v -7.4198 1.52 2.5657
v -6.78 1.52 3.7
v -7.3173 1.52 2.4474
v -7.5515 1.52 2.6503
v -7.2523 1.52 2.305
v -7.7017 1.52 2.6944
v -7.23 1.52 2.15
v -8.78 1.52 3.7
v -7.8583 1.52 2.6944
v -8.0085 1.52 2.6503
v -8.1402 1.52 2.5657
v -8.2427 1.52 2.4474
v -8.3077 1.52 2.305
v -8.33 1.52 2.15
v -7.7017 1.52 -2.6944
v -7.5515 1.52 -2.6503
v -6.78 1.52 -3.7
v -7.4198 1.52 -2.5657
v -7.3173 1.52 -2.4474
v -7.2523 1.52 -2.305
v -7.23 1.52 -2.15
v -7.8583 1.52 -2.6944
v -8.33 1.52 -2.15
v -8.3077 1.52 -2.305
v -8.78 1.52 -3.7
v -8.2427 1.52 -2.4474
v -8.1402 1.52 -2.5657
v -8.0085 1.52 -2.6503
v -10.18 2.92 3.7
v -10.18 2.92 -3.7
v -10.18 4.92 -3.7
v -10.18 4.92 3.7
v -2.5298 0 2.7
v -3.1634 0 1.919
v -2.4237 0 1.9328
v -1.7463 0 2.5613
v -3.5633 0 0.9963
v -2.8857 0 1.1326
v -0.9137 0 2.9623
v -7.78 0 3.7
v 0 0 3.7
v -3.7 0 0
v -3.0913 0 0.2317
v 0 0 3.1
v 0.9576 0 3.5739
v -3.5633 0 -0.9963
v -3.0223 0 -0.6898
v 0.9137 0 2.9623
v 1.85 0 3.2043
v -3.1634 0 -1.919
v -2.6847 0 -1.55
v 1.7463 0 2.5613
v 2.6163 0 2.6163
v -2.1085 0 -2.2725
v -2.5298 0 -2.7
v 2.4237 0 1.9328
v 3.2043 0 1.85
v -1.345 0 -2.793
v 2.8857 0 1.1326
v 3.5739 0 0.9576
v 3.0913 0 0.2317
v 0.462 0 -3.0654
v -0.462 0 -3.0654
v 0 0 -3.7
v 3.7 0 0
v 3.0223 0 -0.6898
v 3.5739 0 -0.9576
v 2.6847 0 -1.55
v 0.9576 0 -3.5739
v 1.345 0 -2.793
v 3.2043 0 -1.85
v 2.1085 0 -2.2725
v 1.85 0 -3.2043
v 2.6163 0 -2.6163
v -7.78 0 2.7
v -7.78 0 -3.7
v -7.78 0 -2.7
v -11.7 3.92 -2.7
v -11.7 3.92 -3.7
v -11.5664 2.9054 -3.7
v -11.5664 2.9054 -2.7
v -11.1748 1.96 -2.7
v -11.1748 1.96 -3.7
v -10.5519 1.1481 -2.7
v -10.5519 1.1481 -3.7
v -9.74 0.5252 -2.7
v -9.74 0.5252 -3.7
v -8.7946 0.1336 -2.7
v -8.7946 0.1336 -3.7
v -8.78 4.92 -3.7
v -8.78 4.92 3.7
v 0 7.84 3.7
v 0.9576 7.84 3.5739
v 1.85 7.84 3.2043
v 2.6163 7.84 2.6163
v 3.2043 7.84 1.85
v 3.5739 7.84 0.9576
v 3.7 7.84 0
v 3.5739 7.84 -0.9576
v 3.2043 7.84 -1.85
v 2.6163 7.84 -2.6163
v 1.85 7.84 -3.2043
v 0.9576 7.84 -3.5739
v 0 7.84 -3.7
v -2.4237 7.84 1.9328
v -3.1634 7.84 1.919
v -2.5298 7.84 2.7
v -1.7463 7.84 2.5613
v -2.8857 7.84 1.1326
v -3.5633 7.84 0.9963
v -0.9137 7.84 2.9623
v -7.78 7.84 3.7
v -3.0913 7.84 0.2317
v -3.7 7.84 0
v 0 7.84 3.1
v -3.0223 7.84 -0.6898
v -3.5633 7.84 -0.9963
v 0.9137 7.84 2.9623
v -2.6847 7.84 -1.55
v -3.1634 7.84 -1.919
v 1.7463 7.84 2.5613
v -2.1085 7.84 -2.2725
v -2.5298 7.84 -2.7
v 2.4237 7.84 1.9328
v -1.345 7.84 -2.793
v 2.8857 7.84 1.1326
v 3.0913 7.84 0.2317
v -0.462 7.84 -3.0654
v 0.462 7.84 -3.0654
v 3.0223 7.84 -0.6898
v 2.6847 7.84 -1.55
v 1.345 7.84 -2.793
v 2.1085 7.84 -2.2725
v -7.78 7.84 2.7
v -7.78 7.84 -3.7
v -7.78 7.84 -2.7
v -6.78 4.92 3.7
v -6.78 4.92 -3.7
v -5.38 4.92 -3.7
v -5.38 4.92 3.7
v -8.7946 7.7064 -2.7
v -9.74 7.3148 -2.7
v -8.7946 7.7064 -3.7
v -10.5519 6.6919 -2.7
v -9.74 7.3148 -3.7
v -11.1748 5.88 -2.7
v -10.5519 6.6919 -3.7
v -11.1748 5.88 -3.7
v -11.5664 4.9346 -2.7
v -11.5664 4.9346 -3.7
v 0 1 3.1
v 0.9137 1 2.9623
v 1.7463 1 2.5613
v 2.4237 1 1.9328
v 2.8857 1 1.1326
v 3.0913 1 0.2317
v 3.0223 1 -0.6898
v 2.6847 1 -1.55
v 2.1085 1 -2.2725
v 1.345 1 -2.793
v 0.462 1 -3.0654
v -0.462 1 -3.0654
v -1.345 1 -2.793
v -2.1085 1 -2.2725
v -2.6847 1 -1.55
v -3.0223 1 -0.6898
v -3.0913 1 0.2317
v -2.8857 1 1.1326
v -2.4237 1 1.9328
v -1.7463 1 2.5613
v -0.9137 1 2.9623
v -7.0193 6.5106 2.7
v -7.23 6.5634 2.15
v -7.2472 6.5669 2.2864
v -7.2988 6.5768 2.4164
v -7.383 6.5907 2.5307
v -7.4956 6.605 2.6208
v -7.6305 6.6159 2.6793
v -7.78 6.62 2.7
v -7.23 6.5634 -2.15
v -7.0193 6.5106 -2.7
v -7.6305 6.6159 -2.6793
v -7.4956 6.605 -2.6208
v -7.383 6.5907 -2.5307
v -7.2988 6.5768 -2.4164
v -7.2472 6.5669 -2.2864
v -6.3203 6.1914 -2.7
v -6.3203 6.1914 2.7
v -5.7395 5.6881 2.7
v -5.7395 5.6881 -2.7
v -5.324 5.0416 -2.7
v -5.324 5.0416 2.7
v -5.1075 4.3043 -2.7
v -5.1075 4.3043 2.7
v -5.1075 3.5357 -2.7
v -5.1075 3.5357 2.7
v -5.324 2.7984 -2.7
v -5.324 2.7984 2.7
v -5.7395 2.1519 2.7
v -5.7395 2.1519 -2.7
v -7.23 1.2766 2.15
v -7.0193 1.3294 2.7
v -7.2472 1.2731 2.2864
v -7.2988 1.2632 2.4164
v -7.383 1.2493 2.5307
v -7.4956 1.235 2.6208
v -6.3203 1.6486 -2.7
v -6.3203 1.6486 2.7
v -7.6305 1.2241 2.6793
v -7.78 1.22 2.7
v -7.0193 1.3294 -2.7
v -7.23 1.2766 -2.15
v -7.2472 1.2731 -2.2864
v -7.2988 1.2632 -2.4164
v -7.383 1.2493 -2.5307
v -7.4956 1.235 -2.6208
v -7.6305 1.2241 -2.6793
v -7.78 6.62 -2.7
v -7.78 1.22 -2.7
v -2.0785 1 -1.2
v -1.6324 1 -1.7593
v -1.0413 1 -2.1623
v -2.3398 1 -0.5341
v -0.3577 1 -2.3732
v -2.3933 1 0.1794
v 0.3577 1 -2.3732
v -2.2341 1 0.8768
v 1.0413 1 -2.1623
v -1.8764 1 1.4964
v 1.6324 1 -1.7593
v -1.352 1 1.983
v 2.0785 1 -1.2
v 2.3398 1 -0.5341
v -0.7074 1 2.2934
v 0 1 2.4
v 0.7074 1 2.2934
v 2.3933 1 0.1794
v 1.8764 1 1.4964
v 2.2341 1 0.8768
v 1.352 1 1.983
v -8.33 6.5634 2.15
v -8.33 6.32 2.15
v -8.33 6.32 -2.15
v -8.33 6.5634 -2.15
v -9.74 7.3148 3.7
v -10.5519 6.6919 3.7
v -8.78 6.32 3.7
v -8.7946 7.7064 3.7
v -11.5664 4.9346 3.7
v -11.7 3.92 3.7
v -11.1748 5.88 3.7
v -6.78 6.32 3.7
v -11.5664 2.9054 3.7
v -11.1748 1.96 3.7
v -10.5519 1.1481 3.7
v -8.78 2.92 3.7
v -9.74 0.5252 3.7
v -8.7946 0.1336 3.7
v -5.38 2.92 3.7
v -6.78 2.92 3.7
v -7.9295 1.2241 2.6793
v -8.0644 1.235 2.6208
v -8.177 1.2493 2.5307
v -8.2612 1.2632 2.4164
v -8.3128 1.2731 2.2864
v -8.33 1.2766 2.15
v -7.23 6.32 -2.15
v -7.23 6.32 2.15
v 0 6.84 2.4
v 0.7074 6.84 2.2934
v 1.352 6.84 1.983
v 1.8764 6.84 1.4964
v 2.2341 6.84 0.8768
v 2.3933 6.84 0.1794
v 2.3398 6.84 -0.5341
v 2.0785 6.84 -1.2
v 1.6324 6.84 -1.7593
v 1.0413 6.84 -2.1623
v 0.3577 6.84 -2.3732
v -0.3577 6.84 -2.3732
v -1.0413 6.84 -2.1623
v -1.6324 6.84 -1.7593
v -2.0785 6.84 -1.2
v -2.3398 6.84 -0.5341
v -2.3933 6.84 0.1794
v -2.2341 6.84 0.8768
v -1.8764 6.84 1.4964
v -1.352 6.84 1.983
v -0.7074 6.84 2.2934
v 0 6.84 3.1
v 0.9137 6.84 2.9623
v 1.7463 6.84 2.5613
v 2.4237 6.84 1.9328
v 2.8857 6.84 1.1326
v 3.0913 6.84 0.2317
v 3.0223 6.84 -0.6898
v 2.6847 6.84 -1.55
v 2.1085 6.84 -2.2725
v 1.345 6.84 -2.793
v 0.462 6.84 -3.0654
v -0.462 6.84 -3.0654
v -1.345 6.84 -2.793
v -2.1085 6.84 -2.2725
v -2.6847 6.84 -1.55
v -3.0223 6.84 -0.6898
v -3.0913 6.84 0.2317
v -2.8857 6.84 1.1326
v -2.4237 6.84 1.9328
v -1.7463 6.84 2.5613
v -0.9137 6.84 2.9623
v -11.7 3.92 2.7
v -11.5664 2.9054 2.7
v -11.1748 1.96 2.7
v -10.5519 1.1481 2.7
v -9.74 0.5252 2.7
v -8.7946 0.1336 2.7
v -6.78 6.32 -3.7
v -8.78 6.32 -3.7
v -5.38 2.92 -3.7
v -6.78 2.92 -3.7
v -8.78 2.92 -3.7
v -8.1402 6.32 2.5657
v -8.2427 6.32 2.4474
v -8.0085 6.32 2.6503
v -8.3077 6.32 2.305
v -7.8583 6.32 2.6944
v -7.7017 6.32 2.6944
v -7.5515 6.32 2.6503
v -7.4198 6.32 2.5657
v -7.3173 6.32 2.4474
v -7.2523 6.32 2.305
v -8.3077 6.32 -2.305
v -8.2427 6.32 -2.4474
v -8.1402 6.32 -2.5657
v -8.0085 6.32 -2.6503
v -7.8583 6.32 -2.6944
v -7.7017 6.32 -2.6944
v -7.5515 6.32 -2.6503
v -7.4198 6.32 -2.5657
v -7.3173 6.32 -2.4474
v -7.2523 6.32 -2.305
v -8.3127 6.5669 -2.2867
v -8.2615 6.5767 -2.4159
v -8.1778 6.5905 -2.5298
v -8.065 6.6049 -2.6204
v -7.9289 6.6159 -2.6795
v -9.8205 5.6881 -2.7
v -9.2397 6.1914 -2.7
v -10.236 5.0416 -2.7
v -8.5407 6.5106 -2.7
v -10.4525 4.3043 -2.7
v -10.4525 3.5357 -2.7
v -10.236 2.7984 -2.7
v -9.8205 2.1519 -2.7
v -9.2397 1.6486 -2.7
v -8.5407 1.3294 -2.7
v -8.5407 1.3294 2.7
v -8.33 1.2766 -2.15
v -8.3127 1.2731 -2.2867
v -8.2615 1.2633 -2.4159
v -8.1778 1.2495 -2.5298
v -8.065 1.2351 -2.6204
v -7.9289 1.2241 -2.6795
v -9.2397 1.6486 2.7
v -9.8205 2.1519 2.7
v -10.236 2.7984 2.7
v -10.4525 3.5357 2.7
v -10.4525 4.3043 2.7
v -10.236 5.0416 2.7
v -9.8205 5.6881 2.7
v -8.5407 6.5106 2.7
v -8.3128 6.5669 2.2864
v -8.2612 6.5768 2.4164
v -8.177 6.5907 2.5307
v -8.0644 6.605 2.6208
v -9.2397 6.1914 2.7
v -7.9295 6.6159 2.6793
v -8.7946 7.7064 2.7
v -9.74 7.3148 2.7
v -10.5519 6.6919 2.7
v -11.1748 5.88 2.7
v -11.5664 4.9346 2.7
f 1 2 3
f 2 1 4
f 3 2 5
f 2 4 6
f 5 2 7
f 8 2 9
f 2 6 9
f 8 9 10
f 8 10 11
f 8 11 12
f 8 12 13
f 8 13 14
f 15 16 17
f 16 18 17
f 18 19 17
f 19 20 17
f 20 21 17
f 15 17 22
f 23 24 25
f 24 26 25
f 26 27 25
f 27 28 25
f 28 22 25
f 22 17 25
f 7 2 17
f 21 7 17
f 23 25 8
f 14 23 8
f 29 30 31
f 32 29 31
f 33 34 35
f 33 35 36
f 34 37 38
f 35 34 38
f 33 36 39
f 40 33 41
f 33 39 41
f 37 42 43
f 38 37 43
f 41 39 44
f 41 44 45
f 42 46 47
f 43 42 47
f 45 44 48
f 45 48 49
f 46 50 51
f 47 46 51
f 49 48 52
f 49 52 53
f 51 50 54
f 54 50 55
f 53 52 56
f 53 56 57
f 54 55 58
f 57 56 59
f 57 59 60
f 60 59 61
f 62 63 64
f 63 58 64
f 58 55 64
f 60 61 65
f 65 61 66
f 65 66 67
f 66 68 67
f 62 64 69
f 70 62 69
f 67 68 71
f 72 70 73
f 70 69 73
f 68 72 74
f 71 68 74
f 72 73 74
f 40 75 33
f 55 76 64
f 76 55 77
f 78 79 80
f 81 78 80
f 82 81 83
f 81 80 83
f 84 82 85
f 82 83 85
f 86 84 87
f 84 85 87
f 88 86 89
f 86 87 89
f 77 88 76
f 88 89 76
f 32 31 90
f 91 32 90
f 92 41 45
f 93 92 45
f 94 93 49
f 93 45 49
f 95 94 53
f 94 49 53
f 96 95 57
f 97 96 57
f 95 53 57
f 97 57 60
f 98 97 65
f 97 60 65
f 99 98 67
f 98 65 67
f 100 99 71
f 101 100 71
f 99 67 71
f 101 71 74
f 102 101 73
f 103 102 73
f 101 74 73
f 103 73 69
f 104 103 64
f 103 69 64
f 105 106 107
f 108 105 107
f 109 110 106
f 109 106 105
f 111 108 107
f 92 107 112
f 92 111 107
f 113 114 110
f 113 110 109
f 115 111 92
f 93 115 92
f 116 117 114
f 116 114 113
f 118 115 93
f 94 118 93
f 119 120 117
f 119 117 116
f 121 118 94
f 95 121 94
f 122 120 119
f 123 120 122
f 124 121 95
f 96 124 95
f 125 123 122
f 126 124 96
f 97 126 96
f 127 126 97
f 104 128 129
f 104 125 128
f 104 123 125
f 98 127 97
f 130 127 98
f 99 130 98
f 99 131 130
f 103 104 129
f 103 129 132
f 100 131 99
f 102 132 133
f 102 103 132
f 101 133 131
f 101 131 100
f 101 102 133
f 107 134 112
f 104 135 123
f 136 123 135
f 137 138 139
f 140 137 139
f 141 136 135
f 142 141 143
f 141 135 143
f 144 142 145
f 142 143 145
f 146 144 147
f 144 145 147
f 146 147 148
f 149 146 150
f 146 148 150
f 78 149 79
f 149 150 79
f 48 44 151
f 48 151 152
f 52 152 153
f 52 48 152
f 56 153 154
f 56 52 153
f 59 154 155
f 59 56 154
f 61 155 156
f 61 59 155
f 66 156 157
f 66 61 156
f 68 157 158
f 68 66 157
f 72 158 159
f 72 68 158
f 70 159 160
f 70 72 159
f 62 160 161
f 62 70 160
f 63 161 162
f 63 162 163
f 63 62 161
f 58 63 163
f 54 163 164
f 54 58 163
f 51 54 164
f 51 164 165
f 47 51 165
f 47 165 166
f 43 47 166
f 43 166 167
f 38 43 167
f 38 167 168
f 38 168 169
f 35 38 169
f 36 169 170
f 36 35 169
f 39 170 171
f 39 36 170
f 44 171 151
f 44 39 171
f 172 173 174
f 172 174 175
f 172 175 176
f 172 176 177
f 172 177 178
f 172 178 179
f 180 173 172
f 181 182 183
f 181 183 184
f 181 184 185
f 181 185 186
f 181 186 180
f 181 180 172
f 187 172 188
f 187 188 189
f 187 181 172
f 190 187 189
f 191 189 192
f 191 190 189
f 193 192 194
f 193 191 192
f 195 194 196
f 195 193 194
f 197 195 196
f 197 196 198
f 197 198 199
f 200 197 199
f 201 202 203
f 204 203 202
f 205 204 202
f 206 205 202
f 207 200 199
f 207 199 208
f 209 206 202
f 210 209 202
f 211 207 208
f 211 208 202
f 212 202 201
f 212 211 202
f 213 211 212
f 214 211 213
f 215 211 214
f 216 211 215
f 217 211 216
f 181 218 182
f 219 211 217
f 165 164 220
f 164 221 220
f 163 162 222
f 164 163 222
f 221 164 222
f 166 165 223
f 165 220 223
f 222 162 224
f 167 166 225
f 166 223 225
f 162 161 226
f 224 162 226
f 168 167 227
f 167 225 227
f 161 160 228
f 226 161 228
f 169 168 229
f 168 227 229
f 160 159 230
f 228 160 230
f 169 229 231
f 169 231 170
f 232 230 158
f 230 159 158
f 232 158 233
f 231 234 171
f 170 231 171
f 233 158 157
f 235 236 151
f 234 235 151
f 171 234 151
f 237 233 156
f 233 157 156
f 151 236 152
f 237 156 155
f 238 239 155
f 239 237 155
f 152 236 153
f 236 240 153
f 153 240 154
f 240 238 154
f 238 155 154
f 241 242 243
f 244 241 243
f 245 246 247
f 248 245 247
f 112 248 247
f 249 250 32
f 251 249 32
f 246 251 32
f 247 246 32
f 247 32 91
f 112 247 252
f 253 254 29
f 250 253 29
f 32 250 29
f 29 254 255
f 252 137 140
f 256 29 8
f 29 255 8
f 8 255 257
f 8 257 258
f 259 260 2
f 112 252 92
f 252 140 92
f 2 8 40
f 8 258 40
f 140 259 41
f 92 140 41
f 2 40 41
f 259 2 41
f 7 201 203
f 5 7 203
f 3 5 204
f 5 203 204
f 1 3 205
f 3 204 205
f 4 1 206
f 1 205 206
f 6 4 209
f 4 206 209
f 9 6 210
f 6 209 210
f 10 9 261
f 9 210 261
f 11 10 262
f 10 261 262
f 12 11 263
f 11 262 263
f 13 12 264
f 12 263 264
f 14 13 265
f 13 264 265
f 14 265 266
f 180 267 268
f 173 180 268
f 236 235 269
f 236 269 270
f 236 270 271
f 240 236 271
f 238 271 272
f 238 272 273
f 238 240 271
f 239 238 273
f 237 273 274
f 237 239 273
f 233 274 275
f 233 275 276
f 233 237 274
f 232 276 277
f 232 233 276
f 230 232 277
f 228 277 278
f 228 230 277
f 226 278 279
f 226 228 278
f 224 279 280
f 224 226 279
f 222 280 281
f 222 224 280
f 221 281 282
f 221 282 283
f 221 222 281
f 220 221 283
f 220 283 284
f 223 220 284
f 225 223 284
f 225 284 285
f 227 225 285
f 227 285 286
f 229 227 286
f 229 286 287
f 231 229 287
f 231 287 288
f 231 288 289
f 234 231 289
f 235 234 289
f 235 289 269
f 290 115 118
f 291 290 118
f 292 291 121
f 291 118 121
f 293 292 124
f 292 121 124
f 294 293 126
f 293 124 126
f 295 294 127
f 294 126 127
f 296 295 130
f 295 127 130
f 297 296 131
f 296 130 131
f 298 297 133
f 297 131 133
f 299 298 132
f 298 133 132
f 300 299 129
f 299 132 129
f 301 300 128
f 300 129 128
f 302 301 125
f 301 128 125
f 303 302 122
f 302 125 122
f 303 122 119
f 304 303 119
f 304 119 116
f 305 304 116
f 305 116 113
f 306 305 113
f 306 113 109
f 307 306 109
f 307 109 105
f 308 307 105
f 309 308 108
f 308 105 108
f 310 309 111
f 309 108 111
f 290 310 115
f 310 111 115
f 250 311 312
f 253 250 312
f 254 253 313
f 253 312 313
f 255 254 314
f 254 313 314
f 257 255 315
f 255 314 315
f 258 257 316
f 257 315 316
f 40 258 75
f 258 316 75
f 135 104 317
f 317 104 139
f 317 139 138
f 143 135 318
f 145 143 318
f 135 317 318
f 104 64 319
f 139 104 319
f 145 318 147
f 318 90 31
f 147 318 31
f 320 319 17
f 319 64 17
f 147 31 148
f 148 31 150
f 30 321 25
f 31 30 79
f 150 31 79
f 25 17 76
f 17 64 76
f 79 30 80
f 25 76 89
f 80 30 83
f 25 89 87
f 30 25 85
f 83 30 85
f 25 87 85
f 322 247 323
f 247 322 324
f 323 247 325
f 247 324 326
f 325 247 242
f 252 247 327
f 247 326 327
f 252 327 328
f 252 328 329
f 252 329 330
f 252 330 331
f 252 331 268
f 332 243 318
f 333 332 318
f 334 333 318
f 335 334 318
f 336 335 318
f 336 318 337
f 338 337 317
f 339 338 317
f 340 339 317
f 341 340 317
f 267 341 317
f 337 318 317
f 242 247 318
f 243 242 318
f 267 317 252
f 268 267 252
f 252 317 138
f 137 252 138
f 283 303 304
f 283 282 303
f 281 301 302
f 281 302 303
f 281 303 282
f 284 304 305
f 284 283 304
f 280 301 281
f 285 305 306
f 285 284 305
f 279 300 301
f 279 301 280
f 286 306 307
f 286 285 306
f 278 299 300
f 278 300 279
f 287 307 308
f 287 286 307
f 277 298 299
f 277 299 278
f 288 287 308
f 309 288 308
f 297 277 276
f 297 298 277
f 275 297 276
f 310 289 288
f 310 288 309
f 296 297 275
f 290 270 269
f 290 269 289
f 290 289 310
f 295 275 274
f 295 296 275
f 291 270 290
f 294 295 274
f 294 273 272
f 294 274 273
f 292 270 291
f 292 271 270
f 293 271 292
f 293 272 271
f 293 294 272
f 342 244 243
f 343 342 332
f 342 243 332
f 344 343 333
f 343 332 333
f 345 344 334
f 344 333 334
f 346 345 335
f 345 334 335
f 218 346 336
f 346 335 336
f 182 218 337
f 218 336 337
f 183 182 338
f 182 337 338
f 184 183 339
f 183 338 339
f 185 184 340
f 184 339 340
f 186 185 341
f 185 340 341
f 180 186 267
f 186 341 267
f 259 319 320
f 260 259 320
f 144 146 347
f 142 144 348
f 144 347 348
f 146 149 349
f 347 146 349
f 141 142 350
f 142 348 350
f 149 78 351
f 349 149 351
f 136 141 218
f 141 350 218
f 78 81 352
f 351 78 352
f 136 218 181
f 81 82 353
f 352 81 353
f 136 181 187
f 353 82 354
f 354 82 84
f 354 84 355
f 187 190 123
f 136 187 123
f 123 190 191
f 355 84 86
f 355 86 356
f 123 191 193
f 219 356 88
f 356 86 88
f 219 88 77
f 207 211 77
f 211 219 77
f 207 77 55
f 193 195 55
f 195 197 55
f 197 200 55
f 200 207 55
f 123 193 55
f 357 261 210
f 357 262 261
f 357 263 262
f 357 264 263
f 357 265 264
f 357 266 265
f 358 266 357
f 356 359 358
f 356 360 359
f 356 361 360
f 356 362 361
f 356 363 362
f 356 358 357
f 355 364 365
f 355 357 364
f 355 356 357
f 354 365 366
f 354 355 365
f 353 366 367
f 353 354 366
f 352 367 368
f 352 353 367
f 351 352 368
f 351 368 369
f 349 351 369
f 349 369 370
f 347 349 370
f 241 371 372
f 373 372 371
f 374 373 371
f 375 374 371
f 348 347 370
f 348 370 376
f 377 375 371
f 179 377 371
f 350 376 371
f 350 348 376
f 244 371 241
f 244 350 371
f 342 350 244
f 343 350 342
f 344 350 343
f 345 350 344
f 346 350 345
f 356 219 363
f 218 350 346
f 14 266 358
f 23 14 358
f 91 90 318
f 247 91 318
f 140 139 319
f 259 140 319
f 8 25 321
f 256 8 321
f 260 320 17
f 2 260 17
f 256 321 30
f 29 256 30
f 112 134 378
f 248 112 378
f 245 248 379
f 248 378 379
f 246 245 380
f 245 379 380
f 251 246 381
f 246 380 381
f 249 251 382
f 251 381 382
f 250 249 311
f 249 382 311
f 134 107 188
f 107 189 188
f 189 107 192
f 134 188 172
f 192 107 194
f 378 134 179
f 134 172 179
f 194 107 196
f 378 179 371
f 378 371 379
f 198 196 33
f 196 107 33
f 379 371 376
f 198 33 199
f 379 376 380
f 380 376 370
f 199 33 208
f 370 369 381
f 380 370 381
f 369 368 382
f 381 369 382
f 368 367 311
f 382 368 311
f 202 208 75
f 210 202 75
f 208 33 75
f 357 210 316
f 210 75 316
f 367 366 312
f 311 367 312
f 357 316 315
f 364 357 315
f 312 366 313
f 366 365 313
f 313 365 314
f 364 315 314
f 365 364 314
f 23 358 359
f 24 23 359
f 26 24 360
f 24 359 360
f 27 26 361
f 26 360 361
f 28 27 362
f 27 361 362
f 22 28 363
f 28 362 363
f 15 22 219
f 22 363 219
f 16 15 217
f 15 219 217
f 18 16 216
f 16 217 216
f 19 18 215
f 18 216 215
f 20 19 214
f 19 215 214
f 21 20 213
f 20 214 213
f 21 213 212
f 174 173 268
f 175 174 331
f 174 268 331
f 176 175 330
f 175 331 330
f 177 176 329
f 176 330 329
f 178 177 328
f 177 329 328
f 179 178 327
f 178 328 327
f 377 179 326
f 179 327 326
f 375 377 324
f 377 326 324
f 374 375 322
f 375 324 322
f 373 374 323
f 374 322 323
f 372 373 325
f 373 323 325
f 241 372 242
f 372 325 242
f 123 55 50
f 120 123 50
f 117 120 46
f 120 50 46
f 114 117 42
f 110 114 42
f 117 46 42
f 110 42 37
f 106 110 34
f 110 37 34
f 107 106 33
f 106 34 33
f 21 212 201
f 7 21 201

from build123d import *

# Parameters (mm, degrees)
SKETCH1_R           = 3.7
SKETCH1_R_2         = 3.1
SKETCH1_R_3         = 2.4
BOSS_EXTRUDE2_DEPTH = 7.84
SKETCH1_5_R         = 3.1
SKETCH1_5_R_2       = 2.4
CUT_EXTRUDE1_DEPTH  = 1
SKETCH3_R           = 3.1
SKETCH3_R_2         = 2.4
CUT_EXTRUDE2_DEPTH  = 1
BOSS_EXTRUDE3_DEPTH = 7.84
CUT_EXTRUDE3_REACH  = 17.91
CUT_EXTRUDE4_DEPTH  = 16.90960716
SKETCH4_5_R         = 2.7
BOSS_EXTRUDE4_DEPTH = 7.4
CUT_EXTRUDE5_DEPTH  = 15.561785605


with BuildPart() as part:
    # Sketch1 → Boss-Extrude2 (new body)
    with BuildSketch(Plane(origin=(0, 0, 0), x_dir=(1, 0, 0), z_dir=(0, 1, 0))):
        with Locations(Location((0, 0, 0), (0, 0, 270))):
            Circle(SKETCH1_R)
        Circle(SKETCH1_R_2, mode=Mode.SUBTRACT)
        Circle(SKETCH1_R_2)
        with Locations(Location((0, 0, 0), (0, 0, 270))):
            Circle(SKETCH1_R_3, mode=Mode.SUBTRACT)
    extrude(amount=BOSS_EXTRUDE2_DEPTH)

    # Sketch1<5> → Cut-Extrude1 (cut)
    with BuildSketch(Plane(origin=(0, 0, 0), x_dir=(1, 0, 0), z_dir=(0, 1, 0))):
        with Locations(Location((0, 0, 0), (0, 0, 270))):
            Circle(SKETCH1_5_R)
        with Locations(Location((0, 0, 0), (0, 0, 270))):
            Circle(SKETCH1_5_R_2, mode=Mode.SUBTRACT)
    extrude(amount=CUT_EXTRUDE1_DEPTH, mode=Mode.SUBTRACT)

    # Sketch3 → Cut-Extrude2 (cut)
    with BuildSketch(Plane(origin=(0, 7.84, 0), x_dir=(1, 0, 0), z_dir=(0, 1, 0))):
        with Locations(Location((0, 0, 0), (0, 0, 270))):
            Circle(SKETCH3_R)
        with Locations(Location((0, 0, 0), (0, 0, 270))):
            Circle(SKETCH3_R_2, mode=Mode.SUBTRACT)
    extrude(amount=-CUT_EXTRUDE2_DEPTH, mode=Mode.SUBTRACT)

    # Sketch1<6> → Boss-Extrude3 (add)
    with BuildSketch(Plane(origin=(0, 0, 0), x_dir=(1, 0, 0), z_dir=(0, 1, 0))):
        with BuildLine():
            Line((-11.7, -2.7), (-11.7, -3.7))
            Line((-11.7, -3.7), (0, -3.7))
            ThreePointArc((0, -3.7), (-1.360147051, -3.440930107), (-2.529822128, -2.7))
            Line((-2.529822128, -2.7), (-11.7, -2.7))
        make_face()
        with BuildLine():
            Line((-11.7, 3.7), (-11.7, 2.7))
            Line((-11.7, 2.7), (-2.529822128, 2.7))
            ThreePointArc((-2.529822128, 2.7), (-1.360147051, 3.440930107), (0, 3.7))
            Line((0, 3.7), (-11.7, 3.7))
        make_face()
    extrude(amount=BOSS_EXTRUDE3_DEPTH)

    # Cut-Extrude3: up to this face of the body (flat: up to its plane)
    cut_extrude3_end = Plane(part.part.faces().sort_by_distance((-5.85, 3.92, 3.7))[0])
    # Sketch4 → Cut-Extrude3 (cut, up to the picked face)
    with BuildSketch(Plane(origin=(0, 0, -3.7), x_dir=(-1, 0, 0), z_dir=(0, 0, -1)), mode=Mode.PRIVATE) as cut_extrude3_sk1:
        with BuildLine():
            Line((11.7, 7.84), (7.78, 7.84))
            ThreePointArc((7.78, 7.84), (10.551858582, 6.691858582), (11.7, 3.92))
            Line((11.7, 3.92), (11.7, 7.84))
        make_face()
    cut_extrude3_tool1 = split(extrude(cut_extrude3_sk1.sketch, amount=-CUT_EXTRUDE3_REACH, mode=Mode.PRIVATE), bisect_by=cut_extrude3_end, keep=Keep.BOTH, mode=Mode.PRIVATE)
    # Sketch4 → Cut-Extrude3 (cut, up to the picked face)
    with BuildSketch(Plane(origin=(0, 0, -3.7), x_dir=(-1, 0, 0), z_dir=(0, 0, -1)), mode=Mode.PRIVATE) as cut_extrude3_sk2:
        with BuildLine():
            Line((11.7, 0), (11.7, 3.92))
            ThreePointArc((11.7, 3.92), (10.551858582, 1.148141418), (7.78, 0))
            Line((7.78, 0), (11.7, 0))
        make_face()
    cut_extrude3_tool2 = split(extrude(cut_extrude3_sk2.sketch, amount=-CUT_EXTRUDE3_REACH, mode=Mode.PRIVATE), bisect_by=cut_extrude3_end, keep=Keep.BOTH, mode=Mode.PRIVATE)
    add(cut_extrude3_tool1.solids().sort_by(Axis((-10.824398, 6.964398, -3.7), (0, 0, 1)))[0], mode=Mode.SUBTRACT)
    add(cut_extrude3_tool2.solids().sort_by(Axis((-10.824398, 0.875602, -3.7), (0, 0, 1)))[0], mode=Mode.SUBTRACT)

    # Sketch4<4> → Cut-Extrude4 (cut, through all)
    with BuildSketch(Plane(origin=(0, 0, -3.7), x_dir=(-1, 0, 0), z_dir=(0, 0, -1))):
        Polygon((8.78, 4.92), (8.78, 6.32), (6.78, 6.32), (6.78, 4.92), (5.38, 4.92), (5.38, 2.92), (6.78, 2.92), (6.78, 1.52), (8.78, 1.52), (8.78, 2.92), (10.18, 2.92), (10.18, 4.92), align=None)
    extrude(amount=-CUT_EXTRUDE4_DEPTH, mode=Mode.SUBTRACT)

    # Sketch4<5> → Boss-Extrude4 (add, through all)
    with BuildSketch(Plane(origin=(0, 0, -3.7), x_dir=(-1, 0, 0), z_dir=(0, 0, -1))):
        with Locations((7.78, 3.92)):
            Circle(SKETCH4_5_R)
        Polygon((8.78, 6.32), (8.78, 4.92), (10.18, 4.92), (10.18, 2.92), (8.78, 2.92), (8.78, 1.52), (6.78, 1.52), (6.78, 2.92), (5.38, 2.92), (5.38, 4.92), (6.78, 4.92), (6.78, 6.32), align=None, mode=Mode.SUBTRACT)
    extrude(amount=-BOSS_EXTRUDE4_DEPTH)

    # Sketch5 → Cut-Extrude5 (cut, through all)
    with BuildSketch(Plane(origin=(0, 0, 0), x_dir=(1, 0, 0), z_dir=(0, 1, 0))):
        with BuildLine():
            Line((-8.33, -2.15), (-8.33, 2.15))
            ThreePointArc((-8.33, 2.15), (-7.78, 2.7), (-7.23, 2.15))
            Line((-7.23, 2.15), (-7.23, -2.15))
            ThreePointArc((-7.23, -2.15), (-7.78, -2.7), (-8.33, -2.15))
        make_face()
    extrude(amount=CUT_EXTRUDE5_DEPTH, mode=Mode.SUBTRACT)


solid = part.part
